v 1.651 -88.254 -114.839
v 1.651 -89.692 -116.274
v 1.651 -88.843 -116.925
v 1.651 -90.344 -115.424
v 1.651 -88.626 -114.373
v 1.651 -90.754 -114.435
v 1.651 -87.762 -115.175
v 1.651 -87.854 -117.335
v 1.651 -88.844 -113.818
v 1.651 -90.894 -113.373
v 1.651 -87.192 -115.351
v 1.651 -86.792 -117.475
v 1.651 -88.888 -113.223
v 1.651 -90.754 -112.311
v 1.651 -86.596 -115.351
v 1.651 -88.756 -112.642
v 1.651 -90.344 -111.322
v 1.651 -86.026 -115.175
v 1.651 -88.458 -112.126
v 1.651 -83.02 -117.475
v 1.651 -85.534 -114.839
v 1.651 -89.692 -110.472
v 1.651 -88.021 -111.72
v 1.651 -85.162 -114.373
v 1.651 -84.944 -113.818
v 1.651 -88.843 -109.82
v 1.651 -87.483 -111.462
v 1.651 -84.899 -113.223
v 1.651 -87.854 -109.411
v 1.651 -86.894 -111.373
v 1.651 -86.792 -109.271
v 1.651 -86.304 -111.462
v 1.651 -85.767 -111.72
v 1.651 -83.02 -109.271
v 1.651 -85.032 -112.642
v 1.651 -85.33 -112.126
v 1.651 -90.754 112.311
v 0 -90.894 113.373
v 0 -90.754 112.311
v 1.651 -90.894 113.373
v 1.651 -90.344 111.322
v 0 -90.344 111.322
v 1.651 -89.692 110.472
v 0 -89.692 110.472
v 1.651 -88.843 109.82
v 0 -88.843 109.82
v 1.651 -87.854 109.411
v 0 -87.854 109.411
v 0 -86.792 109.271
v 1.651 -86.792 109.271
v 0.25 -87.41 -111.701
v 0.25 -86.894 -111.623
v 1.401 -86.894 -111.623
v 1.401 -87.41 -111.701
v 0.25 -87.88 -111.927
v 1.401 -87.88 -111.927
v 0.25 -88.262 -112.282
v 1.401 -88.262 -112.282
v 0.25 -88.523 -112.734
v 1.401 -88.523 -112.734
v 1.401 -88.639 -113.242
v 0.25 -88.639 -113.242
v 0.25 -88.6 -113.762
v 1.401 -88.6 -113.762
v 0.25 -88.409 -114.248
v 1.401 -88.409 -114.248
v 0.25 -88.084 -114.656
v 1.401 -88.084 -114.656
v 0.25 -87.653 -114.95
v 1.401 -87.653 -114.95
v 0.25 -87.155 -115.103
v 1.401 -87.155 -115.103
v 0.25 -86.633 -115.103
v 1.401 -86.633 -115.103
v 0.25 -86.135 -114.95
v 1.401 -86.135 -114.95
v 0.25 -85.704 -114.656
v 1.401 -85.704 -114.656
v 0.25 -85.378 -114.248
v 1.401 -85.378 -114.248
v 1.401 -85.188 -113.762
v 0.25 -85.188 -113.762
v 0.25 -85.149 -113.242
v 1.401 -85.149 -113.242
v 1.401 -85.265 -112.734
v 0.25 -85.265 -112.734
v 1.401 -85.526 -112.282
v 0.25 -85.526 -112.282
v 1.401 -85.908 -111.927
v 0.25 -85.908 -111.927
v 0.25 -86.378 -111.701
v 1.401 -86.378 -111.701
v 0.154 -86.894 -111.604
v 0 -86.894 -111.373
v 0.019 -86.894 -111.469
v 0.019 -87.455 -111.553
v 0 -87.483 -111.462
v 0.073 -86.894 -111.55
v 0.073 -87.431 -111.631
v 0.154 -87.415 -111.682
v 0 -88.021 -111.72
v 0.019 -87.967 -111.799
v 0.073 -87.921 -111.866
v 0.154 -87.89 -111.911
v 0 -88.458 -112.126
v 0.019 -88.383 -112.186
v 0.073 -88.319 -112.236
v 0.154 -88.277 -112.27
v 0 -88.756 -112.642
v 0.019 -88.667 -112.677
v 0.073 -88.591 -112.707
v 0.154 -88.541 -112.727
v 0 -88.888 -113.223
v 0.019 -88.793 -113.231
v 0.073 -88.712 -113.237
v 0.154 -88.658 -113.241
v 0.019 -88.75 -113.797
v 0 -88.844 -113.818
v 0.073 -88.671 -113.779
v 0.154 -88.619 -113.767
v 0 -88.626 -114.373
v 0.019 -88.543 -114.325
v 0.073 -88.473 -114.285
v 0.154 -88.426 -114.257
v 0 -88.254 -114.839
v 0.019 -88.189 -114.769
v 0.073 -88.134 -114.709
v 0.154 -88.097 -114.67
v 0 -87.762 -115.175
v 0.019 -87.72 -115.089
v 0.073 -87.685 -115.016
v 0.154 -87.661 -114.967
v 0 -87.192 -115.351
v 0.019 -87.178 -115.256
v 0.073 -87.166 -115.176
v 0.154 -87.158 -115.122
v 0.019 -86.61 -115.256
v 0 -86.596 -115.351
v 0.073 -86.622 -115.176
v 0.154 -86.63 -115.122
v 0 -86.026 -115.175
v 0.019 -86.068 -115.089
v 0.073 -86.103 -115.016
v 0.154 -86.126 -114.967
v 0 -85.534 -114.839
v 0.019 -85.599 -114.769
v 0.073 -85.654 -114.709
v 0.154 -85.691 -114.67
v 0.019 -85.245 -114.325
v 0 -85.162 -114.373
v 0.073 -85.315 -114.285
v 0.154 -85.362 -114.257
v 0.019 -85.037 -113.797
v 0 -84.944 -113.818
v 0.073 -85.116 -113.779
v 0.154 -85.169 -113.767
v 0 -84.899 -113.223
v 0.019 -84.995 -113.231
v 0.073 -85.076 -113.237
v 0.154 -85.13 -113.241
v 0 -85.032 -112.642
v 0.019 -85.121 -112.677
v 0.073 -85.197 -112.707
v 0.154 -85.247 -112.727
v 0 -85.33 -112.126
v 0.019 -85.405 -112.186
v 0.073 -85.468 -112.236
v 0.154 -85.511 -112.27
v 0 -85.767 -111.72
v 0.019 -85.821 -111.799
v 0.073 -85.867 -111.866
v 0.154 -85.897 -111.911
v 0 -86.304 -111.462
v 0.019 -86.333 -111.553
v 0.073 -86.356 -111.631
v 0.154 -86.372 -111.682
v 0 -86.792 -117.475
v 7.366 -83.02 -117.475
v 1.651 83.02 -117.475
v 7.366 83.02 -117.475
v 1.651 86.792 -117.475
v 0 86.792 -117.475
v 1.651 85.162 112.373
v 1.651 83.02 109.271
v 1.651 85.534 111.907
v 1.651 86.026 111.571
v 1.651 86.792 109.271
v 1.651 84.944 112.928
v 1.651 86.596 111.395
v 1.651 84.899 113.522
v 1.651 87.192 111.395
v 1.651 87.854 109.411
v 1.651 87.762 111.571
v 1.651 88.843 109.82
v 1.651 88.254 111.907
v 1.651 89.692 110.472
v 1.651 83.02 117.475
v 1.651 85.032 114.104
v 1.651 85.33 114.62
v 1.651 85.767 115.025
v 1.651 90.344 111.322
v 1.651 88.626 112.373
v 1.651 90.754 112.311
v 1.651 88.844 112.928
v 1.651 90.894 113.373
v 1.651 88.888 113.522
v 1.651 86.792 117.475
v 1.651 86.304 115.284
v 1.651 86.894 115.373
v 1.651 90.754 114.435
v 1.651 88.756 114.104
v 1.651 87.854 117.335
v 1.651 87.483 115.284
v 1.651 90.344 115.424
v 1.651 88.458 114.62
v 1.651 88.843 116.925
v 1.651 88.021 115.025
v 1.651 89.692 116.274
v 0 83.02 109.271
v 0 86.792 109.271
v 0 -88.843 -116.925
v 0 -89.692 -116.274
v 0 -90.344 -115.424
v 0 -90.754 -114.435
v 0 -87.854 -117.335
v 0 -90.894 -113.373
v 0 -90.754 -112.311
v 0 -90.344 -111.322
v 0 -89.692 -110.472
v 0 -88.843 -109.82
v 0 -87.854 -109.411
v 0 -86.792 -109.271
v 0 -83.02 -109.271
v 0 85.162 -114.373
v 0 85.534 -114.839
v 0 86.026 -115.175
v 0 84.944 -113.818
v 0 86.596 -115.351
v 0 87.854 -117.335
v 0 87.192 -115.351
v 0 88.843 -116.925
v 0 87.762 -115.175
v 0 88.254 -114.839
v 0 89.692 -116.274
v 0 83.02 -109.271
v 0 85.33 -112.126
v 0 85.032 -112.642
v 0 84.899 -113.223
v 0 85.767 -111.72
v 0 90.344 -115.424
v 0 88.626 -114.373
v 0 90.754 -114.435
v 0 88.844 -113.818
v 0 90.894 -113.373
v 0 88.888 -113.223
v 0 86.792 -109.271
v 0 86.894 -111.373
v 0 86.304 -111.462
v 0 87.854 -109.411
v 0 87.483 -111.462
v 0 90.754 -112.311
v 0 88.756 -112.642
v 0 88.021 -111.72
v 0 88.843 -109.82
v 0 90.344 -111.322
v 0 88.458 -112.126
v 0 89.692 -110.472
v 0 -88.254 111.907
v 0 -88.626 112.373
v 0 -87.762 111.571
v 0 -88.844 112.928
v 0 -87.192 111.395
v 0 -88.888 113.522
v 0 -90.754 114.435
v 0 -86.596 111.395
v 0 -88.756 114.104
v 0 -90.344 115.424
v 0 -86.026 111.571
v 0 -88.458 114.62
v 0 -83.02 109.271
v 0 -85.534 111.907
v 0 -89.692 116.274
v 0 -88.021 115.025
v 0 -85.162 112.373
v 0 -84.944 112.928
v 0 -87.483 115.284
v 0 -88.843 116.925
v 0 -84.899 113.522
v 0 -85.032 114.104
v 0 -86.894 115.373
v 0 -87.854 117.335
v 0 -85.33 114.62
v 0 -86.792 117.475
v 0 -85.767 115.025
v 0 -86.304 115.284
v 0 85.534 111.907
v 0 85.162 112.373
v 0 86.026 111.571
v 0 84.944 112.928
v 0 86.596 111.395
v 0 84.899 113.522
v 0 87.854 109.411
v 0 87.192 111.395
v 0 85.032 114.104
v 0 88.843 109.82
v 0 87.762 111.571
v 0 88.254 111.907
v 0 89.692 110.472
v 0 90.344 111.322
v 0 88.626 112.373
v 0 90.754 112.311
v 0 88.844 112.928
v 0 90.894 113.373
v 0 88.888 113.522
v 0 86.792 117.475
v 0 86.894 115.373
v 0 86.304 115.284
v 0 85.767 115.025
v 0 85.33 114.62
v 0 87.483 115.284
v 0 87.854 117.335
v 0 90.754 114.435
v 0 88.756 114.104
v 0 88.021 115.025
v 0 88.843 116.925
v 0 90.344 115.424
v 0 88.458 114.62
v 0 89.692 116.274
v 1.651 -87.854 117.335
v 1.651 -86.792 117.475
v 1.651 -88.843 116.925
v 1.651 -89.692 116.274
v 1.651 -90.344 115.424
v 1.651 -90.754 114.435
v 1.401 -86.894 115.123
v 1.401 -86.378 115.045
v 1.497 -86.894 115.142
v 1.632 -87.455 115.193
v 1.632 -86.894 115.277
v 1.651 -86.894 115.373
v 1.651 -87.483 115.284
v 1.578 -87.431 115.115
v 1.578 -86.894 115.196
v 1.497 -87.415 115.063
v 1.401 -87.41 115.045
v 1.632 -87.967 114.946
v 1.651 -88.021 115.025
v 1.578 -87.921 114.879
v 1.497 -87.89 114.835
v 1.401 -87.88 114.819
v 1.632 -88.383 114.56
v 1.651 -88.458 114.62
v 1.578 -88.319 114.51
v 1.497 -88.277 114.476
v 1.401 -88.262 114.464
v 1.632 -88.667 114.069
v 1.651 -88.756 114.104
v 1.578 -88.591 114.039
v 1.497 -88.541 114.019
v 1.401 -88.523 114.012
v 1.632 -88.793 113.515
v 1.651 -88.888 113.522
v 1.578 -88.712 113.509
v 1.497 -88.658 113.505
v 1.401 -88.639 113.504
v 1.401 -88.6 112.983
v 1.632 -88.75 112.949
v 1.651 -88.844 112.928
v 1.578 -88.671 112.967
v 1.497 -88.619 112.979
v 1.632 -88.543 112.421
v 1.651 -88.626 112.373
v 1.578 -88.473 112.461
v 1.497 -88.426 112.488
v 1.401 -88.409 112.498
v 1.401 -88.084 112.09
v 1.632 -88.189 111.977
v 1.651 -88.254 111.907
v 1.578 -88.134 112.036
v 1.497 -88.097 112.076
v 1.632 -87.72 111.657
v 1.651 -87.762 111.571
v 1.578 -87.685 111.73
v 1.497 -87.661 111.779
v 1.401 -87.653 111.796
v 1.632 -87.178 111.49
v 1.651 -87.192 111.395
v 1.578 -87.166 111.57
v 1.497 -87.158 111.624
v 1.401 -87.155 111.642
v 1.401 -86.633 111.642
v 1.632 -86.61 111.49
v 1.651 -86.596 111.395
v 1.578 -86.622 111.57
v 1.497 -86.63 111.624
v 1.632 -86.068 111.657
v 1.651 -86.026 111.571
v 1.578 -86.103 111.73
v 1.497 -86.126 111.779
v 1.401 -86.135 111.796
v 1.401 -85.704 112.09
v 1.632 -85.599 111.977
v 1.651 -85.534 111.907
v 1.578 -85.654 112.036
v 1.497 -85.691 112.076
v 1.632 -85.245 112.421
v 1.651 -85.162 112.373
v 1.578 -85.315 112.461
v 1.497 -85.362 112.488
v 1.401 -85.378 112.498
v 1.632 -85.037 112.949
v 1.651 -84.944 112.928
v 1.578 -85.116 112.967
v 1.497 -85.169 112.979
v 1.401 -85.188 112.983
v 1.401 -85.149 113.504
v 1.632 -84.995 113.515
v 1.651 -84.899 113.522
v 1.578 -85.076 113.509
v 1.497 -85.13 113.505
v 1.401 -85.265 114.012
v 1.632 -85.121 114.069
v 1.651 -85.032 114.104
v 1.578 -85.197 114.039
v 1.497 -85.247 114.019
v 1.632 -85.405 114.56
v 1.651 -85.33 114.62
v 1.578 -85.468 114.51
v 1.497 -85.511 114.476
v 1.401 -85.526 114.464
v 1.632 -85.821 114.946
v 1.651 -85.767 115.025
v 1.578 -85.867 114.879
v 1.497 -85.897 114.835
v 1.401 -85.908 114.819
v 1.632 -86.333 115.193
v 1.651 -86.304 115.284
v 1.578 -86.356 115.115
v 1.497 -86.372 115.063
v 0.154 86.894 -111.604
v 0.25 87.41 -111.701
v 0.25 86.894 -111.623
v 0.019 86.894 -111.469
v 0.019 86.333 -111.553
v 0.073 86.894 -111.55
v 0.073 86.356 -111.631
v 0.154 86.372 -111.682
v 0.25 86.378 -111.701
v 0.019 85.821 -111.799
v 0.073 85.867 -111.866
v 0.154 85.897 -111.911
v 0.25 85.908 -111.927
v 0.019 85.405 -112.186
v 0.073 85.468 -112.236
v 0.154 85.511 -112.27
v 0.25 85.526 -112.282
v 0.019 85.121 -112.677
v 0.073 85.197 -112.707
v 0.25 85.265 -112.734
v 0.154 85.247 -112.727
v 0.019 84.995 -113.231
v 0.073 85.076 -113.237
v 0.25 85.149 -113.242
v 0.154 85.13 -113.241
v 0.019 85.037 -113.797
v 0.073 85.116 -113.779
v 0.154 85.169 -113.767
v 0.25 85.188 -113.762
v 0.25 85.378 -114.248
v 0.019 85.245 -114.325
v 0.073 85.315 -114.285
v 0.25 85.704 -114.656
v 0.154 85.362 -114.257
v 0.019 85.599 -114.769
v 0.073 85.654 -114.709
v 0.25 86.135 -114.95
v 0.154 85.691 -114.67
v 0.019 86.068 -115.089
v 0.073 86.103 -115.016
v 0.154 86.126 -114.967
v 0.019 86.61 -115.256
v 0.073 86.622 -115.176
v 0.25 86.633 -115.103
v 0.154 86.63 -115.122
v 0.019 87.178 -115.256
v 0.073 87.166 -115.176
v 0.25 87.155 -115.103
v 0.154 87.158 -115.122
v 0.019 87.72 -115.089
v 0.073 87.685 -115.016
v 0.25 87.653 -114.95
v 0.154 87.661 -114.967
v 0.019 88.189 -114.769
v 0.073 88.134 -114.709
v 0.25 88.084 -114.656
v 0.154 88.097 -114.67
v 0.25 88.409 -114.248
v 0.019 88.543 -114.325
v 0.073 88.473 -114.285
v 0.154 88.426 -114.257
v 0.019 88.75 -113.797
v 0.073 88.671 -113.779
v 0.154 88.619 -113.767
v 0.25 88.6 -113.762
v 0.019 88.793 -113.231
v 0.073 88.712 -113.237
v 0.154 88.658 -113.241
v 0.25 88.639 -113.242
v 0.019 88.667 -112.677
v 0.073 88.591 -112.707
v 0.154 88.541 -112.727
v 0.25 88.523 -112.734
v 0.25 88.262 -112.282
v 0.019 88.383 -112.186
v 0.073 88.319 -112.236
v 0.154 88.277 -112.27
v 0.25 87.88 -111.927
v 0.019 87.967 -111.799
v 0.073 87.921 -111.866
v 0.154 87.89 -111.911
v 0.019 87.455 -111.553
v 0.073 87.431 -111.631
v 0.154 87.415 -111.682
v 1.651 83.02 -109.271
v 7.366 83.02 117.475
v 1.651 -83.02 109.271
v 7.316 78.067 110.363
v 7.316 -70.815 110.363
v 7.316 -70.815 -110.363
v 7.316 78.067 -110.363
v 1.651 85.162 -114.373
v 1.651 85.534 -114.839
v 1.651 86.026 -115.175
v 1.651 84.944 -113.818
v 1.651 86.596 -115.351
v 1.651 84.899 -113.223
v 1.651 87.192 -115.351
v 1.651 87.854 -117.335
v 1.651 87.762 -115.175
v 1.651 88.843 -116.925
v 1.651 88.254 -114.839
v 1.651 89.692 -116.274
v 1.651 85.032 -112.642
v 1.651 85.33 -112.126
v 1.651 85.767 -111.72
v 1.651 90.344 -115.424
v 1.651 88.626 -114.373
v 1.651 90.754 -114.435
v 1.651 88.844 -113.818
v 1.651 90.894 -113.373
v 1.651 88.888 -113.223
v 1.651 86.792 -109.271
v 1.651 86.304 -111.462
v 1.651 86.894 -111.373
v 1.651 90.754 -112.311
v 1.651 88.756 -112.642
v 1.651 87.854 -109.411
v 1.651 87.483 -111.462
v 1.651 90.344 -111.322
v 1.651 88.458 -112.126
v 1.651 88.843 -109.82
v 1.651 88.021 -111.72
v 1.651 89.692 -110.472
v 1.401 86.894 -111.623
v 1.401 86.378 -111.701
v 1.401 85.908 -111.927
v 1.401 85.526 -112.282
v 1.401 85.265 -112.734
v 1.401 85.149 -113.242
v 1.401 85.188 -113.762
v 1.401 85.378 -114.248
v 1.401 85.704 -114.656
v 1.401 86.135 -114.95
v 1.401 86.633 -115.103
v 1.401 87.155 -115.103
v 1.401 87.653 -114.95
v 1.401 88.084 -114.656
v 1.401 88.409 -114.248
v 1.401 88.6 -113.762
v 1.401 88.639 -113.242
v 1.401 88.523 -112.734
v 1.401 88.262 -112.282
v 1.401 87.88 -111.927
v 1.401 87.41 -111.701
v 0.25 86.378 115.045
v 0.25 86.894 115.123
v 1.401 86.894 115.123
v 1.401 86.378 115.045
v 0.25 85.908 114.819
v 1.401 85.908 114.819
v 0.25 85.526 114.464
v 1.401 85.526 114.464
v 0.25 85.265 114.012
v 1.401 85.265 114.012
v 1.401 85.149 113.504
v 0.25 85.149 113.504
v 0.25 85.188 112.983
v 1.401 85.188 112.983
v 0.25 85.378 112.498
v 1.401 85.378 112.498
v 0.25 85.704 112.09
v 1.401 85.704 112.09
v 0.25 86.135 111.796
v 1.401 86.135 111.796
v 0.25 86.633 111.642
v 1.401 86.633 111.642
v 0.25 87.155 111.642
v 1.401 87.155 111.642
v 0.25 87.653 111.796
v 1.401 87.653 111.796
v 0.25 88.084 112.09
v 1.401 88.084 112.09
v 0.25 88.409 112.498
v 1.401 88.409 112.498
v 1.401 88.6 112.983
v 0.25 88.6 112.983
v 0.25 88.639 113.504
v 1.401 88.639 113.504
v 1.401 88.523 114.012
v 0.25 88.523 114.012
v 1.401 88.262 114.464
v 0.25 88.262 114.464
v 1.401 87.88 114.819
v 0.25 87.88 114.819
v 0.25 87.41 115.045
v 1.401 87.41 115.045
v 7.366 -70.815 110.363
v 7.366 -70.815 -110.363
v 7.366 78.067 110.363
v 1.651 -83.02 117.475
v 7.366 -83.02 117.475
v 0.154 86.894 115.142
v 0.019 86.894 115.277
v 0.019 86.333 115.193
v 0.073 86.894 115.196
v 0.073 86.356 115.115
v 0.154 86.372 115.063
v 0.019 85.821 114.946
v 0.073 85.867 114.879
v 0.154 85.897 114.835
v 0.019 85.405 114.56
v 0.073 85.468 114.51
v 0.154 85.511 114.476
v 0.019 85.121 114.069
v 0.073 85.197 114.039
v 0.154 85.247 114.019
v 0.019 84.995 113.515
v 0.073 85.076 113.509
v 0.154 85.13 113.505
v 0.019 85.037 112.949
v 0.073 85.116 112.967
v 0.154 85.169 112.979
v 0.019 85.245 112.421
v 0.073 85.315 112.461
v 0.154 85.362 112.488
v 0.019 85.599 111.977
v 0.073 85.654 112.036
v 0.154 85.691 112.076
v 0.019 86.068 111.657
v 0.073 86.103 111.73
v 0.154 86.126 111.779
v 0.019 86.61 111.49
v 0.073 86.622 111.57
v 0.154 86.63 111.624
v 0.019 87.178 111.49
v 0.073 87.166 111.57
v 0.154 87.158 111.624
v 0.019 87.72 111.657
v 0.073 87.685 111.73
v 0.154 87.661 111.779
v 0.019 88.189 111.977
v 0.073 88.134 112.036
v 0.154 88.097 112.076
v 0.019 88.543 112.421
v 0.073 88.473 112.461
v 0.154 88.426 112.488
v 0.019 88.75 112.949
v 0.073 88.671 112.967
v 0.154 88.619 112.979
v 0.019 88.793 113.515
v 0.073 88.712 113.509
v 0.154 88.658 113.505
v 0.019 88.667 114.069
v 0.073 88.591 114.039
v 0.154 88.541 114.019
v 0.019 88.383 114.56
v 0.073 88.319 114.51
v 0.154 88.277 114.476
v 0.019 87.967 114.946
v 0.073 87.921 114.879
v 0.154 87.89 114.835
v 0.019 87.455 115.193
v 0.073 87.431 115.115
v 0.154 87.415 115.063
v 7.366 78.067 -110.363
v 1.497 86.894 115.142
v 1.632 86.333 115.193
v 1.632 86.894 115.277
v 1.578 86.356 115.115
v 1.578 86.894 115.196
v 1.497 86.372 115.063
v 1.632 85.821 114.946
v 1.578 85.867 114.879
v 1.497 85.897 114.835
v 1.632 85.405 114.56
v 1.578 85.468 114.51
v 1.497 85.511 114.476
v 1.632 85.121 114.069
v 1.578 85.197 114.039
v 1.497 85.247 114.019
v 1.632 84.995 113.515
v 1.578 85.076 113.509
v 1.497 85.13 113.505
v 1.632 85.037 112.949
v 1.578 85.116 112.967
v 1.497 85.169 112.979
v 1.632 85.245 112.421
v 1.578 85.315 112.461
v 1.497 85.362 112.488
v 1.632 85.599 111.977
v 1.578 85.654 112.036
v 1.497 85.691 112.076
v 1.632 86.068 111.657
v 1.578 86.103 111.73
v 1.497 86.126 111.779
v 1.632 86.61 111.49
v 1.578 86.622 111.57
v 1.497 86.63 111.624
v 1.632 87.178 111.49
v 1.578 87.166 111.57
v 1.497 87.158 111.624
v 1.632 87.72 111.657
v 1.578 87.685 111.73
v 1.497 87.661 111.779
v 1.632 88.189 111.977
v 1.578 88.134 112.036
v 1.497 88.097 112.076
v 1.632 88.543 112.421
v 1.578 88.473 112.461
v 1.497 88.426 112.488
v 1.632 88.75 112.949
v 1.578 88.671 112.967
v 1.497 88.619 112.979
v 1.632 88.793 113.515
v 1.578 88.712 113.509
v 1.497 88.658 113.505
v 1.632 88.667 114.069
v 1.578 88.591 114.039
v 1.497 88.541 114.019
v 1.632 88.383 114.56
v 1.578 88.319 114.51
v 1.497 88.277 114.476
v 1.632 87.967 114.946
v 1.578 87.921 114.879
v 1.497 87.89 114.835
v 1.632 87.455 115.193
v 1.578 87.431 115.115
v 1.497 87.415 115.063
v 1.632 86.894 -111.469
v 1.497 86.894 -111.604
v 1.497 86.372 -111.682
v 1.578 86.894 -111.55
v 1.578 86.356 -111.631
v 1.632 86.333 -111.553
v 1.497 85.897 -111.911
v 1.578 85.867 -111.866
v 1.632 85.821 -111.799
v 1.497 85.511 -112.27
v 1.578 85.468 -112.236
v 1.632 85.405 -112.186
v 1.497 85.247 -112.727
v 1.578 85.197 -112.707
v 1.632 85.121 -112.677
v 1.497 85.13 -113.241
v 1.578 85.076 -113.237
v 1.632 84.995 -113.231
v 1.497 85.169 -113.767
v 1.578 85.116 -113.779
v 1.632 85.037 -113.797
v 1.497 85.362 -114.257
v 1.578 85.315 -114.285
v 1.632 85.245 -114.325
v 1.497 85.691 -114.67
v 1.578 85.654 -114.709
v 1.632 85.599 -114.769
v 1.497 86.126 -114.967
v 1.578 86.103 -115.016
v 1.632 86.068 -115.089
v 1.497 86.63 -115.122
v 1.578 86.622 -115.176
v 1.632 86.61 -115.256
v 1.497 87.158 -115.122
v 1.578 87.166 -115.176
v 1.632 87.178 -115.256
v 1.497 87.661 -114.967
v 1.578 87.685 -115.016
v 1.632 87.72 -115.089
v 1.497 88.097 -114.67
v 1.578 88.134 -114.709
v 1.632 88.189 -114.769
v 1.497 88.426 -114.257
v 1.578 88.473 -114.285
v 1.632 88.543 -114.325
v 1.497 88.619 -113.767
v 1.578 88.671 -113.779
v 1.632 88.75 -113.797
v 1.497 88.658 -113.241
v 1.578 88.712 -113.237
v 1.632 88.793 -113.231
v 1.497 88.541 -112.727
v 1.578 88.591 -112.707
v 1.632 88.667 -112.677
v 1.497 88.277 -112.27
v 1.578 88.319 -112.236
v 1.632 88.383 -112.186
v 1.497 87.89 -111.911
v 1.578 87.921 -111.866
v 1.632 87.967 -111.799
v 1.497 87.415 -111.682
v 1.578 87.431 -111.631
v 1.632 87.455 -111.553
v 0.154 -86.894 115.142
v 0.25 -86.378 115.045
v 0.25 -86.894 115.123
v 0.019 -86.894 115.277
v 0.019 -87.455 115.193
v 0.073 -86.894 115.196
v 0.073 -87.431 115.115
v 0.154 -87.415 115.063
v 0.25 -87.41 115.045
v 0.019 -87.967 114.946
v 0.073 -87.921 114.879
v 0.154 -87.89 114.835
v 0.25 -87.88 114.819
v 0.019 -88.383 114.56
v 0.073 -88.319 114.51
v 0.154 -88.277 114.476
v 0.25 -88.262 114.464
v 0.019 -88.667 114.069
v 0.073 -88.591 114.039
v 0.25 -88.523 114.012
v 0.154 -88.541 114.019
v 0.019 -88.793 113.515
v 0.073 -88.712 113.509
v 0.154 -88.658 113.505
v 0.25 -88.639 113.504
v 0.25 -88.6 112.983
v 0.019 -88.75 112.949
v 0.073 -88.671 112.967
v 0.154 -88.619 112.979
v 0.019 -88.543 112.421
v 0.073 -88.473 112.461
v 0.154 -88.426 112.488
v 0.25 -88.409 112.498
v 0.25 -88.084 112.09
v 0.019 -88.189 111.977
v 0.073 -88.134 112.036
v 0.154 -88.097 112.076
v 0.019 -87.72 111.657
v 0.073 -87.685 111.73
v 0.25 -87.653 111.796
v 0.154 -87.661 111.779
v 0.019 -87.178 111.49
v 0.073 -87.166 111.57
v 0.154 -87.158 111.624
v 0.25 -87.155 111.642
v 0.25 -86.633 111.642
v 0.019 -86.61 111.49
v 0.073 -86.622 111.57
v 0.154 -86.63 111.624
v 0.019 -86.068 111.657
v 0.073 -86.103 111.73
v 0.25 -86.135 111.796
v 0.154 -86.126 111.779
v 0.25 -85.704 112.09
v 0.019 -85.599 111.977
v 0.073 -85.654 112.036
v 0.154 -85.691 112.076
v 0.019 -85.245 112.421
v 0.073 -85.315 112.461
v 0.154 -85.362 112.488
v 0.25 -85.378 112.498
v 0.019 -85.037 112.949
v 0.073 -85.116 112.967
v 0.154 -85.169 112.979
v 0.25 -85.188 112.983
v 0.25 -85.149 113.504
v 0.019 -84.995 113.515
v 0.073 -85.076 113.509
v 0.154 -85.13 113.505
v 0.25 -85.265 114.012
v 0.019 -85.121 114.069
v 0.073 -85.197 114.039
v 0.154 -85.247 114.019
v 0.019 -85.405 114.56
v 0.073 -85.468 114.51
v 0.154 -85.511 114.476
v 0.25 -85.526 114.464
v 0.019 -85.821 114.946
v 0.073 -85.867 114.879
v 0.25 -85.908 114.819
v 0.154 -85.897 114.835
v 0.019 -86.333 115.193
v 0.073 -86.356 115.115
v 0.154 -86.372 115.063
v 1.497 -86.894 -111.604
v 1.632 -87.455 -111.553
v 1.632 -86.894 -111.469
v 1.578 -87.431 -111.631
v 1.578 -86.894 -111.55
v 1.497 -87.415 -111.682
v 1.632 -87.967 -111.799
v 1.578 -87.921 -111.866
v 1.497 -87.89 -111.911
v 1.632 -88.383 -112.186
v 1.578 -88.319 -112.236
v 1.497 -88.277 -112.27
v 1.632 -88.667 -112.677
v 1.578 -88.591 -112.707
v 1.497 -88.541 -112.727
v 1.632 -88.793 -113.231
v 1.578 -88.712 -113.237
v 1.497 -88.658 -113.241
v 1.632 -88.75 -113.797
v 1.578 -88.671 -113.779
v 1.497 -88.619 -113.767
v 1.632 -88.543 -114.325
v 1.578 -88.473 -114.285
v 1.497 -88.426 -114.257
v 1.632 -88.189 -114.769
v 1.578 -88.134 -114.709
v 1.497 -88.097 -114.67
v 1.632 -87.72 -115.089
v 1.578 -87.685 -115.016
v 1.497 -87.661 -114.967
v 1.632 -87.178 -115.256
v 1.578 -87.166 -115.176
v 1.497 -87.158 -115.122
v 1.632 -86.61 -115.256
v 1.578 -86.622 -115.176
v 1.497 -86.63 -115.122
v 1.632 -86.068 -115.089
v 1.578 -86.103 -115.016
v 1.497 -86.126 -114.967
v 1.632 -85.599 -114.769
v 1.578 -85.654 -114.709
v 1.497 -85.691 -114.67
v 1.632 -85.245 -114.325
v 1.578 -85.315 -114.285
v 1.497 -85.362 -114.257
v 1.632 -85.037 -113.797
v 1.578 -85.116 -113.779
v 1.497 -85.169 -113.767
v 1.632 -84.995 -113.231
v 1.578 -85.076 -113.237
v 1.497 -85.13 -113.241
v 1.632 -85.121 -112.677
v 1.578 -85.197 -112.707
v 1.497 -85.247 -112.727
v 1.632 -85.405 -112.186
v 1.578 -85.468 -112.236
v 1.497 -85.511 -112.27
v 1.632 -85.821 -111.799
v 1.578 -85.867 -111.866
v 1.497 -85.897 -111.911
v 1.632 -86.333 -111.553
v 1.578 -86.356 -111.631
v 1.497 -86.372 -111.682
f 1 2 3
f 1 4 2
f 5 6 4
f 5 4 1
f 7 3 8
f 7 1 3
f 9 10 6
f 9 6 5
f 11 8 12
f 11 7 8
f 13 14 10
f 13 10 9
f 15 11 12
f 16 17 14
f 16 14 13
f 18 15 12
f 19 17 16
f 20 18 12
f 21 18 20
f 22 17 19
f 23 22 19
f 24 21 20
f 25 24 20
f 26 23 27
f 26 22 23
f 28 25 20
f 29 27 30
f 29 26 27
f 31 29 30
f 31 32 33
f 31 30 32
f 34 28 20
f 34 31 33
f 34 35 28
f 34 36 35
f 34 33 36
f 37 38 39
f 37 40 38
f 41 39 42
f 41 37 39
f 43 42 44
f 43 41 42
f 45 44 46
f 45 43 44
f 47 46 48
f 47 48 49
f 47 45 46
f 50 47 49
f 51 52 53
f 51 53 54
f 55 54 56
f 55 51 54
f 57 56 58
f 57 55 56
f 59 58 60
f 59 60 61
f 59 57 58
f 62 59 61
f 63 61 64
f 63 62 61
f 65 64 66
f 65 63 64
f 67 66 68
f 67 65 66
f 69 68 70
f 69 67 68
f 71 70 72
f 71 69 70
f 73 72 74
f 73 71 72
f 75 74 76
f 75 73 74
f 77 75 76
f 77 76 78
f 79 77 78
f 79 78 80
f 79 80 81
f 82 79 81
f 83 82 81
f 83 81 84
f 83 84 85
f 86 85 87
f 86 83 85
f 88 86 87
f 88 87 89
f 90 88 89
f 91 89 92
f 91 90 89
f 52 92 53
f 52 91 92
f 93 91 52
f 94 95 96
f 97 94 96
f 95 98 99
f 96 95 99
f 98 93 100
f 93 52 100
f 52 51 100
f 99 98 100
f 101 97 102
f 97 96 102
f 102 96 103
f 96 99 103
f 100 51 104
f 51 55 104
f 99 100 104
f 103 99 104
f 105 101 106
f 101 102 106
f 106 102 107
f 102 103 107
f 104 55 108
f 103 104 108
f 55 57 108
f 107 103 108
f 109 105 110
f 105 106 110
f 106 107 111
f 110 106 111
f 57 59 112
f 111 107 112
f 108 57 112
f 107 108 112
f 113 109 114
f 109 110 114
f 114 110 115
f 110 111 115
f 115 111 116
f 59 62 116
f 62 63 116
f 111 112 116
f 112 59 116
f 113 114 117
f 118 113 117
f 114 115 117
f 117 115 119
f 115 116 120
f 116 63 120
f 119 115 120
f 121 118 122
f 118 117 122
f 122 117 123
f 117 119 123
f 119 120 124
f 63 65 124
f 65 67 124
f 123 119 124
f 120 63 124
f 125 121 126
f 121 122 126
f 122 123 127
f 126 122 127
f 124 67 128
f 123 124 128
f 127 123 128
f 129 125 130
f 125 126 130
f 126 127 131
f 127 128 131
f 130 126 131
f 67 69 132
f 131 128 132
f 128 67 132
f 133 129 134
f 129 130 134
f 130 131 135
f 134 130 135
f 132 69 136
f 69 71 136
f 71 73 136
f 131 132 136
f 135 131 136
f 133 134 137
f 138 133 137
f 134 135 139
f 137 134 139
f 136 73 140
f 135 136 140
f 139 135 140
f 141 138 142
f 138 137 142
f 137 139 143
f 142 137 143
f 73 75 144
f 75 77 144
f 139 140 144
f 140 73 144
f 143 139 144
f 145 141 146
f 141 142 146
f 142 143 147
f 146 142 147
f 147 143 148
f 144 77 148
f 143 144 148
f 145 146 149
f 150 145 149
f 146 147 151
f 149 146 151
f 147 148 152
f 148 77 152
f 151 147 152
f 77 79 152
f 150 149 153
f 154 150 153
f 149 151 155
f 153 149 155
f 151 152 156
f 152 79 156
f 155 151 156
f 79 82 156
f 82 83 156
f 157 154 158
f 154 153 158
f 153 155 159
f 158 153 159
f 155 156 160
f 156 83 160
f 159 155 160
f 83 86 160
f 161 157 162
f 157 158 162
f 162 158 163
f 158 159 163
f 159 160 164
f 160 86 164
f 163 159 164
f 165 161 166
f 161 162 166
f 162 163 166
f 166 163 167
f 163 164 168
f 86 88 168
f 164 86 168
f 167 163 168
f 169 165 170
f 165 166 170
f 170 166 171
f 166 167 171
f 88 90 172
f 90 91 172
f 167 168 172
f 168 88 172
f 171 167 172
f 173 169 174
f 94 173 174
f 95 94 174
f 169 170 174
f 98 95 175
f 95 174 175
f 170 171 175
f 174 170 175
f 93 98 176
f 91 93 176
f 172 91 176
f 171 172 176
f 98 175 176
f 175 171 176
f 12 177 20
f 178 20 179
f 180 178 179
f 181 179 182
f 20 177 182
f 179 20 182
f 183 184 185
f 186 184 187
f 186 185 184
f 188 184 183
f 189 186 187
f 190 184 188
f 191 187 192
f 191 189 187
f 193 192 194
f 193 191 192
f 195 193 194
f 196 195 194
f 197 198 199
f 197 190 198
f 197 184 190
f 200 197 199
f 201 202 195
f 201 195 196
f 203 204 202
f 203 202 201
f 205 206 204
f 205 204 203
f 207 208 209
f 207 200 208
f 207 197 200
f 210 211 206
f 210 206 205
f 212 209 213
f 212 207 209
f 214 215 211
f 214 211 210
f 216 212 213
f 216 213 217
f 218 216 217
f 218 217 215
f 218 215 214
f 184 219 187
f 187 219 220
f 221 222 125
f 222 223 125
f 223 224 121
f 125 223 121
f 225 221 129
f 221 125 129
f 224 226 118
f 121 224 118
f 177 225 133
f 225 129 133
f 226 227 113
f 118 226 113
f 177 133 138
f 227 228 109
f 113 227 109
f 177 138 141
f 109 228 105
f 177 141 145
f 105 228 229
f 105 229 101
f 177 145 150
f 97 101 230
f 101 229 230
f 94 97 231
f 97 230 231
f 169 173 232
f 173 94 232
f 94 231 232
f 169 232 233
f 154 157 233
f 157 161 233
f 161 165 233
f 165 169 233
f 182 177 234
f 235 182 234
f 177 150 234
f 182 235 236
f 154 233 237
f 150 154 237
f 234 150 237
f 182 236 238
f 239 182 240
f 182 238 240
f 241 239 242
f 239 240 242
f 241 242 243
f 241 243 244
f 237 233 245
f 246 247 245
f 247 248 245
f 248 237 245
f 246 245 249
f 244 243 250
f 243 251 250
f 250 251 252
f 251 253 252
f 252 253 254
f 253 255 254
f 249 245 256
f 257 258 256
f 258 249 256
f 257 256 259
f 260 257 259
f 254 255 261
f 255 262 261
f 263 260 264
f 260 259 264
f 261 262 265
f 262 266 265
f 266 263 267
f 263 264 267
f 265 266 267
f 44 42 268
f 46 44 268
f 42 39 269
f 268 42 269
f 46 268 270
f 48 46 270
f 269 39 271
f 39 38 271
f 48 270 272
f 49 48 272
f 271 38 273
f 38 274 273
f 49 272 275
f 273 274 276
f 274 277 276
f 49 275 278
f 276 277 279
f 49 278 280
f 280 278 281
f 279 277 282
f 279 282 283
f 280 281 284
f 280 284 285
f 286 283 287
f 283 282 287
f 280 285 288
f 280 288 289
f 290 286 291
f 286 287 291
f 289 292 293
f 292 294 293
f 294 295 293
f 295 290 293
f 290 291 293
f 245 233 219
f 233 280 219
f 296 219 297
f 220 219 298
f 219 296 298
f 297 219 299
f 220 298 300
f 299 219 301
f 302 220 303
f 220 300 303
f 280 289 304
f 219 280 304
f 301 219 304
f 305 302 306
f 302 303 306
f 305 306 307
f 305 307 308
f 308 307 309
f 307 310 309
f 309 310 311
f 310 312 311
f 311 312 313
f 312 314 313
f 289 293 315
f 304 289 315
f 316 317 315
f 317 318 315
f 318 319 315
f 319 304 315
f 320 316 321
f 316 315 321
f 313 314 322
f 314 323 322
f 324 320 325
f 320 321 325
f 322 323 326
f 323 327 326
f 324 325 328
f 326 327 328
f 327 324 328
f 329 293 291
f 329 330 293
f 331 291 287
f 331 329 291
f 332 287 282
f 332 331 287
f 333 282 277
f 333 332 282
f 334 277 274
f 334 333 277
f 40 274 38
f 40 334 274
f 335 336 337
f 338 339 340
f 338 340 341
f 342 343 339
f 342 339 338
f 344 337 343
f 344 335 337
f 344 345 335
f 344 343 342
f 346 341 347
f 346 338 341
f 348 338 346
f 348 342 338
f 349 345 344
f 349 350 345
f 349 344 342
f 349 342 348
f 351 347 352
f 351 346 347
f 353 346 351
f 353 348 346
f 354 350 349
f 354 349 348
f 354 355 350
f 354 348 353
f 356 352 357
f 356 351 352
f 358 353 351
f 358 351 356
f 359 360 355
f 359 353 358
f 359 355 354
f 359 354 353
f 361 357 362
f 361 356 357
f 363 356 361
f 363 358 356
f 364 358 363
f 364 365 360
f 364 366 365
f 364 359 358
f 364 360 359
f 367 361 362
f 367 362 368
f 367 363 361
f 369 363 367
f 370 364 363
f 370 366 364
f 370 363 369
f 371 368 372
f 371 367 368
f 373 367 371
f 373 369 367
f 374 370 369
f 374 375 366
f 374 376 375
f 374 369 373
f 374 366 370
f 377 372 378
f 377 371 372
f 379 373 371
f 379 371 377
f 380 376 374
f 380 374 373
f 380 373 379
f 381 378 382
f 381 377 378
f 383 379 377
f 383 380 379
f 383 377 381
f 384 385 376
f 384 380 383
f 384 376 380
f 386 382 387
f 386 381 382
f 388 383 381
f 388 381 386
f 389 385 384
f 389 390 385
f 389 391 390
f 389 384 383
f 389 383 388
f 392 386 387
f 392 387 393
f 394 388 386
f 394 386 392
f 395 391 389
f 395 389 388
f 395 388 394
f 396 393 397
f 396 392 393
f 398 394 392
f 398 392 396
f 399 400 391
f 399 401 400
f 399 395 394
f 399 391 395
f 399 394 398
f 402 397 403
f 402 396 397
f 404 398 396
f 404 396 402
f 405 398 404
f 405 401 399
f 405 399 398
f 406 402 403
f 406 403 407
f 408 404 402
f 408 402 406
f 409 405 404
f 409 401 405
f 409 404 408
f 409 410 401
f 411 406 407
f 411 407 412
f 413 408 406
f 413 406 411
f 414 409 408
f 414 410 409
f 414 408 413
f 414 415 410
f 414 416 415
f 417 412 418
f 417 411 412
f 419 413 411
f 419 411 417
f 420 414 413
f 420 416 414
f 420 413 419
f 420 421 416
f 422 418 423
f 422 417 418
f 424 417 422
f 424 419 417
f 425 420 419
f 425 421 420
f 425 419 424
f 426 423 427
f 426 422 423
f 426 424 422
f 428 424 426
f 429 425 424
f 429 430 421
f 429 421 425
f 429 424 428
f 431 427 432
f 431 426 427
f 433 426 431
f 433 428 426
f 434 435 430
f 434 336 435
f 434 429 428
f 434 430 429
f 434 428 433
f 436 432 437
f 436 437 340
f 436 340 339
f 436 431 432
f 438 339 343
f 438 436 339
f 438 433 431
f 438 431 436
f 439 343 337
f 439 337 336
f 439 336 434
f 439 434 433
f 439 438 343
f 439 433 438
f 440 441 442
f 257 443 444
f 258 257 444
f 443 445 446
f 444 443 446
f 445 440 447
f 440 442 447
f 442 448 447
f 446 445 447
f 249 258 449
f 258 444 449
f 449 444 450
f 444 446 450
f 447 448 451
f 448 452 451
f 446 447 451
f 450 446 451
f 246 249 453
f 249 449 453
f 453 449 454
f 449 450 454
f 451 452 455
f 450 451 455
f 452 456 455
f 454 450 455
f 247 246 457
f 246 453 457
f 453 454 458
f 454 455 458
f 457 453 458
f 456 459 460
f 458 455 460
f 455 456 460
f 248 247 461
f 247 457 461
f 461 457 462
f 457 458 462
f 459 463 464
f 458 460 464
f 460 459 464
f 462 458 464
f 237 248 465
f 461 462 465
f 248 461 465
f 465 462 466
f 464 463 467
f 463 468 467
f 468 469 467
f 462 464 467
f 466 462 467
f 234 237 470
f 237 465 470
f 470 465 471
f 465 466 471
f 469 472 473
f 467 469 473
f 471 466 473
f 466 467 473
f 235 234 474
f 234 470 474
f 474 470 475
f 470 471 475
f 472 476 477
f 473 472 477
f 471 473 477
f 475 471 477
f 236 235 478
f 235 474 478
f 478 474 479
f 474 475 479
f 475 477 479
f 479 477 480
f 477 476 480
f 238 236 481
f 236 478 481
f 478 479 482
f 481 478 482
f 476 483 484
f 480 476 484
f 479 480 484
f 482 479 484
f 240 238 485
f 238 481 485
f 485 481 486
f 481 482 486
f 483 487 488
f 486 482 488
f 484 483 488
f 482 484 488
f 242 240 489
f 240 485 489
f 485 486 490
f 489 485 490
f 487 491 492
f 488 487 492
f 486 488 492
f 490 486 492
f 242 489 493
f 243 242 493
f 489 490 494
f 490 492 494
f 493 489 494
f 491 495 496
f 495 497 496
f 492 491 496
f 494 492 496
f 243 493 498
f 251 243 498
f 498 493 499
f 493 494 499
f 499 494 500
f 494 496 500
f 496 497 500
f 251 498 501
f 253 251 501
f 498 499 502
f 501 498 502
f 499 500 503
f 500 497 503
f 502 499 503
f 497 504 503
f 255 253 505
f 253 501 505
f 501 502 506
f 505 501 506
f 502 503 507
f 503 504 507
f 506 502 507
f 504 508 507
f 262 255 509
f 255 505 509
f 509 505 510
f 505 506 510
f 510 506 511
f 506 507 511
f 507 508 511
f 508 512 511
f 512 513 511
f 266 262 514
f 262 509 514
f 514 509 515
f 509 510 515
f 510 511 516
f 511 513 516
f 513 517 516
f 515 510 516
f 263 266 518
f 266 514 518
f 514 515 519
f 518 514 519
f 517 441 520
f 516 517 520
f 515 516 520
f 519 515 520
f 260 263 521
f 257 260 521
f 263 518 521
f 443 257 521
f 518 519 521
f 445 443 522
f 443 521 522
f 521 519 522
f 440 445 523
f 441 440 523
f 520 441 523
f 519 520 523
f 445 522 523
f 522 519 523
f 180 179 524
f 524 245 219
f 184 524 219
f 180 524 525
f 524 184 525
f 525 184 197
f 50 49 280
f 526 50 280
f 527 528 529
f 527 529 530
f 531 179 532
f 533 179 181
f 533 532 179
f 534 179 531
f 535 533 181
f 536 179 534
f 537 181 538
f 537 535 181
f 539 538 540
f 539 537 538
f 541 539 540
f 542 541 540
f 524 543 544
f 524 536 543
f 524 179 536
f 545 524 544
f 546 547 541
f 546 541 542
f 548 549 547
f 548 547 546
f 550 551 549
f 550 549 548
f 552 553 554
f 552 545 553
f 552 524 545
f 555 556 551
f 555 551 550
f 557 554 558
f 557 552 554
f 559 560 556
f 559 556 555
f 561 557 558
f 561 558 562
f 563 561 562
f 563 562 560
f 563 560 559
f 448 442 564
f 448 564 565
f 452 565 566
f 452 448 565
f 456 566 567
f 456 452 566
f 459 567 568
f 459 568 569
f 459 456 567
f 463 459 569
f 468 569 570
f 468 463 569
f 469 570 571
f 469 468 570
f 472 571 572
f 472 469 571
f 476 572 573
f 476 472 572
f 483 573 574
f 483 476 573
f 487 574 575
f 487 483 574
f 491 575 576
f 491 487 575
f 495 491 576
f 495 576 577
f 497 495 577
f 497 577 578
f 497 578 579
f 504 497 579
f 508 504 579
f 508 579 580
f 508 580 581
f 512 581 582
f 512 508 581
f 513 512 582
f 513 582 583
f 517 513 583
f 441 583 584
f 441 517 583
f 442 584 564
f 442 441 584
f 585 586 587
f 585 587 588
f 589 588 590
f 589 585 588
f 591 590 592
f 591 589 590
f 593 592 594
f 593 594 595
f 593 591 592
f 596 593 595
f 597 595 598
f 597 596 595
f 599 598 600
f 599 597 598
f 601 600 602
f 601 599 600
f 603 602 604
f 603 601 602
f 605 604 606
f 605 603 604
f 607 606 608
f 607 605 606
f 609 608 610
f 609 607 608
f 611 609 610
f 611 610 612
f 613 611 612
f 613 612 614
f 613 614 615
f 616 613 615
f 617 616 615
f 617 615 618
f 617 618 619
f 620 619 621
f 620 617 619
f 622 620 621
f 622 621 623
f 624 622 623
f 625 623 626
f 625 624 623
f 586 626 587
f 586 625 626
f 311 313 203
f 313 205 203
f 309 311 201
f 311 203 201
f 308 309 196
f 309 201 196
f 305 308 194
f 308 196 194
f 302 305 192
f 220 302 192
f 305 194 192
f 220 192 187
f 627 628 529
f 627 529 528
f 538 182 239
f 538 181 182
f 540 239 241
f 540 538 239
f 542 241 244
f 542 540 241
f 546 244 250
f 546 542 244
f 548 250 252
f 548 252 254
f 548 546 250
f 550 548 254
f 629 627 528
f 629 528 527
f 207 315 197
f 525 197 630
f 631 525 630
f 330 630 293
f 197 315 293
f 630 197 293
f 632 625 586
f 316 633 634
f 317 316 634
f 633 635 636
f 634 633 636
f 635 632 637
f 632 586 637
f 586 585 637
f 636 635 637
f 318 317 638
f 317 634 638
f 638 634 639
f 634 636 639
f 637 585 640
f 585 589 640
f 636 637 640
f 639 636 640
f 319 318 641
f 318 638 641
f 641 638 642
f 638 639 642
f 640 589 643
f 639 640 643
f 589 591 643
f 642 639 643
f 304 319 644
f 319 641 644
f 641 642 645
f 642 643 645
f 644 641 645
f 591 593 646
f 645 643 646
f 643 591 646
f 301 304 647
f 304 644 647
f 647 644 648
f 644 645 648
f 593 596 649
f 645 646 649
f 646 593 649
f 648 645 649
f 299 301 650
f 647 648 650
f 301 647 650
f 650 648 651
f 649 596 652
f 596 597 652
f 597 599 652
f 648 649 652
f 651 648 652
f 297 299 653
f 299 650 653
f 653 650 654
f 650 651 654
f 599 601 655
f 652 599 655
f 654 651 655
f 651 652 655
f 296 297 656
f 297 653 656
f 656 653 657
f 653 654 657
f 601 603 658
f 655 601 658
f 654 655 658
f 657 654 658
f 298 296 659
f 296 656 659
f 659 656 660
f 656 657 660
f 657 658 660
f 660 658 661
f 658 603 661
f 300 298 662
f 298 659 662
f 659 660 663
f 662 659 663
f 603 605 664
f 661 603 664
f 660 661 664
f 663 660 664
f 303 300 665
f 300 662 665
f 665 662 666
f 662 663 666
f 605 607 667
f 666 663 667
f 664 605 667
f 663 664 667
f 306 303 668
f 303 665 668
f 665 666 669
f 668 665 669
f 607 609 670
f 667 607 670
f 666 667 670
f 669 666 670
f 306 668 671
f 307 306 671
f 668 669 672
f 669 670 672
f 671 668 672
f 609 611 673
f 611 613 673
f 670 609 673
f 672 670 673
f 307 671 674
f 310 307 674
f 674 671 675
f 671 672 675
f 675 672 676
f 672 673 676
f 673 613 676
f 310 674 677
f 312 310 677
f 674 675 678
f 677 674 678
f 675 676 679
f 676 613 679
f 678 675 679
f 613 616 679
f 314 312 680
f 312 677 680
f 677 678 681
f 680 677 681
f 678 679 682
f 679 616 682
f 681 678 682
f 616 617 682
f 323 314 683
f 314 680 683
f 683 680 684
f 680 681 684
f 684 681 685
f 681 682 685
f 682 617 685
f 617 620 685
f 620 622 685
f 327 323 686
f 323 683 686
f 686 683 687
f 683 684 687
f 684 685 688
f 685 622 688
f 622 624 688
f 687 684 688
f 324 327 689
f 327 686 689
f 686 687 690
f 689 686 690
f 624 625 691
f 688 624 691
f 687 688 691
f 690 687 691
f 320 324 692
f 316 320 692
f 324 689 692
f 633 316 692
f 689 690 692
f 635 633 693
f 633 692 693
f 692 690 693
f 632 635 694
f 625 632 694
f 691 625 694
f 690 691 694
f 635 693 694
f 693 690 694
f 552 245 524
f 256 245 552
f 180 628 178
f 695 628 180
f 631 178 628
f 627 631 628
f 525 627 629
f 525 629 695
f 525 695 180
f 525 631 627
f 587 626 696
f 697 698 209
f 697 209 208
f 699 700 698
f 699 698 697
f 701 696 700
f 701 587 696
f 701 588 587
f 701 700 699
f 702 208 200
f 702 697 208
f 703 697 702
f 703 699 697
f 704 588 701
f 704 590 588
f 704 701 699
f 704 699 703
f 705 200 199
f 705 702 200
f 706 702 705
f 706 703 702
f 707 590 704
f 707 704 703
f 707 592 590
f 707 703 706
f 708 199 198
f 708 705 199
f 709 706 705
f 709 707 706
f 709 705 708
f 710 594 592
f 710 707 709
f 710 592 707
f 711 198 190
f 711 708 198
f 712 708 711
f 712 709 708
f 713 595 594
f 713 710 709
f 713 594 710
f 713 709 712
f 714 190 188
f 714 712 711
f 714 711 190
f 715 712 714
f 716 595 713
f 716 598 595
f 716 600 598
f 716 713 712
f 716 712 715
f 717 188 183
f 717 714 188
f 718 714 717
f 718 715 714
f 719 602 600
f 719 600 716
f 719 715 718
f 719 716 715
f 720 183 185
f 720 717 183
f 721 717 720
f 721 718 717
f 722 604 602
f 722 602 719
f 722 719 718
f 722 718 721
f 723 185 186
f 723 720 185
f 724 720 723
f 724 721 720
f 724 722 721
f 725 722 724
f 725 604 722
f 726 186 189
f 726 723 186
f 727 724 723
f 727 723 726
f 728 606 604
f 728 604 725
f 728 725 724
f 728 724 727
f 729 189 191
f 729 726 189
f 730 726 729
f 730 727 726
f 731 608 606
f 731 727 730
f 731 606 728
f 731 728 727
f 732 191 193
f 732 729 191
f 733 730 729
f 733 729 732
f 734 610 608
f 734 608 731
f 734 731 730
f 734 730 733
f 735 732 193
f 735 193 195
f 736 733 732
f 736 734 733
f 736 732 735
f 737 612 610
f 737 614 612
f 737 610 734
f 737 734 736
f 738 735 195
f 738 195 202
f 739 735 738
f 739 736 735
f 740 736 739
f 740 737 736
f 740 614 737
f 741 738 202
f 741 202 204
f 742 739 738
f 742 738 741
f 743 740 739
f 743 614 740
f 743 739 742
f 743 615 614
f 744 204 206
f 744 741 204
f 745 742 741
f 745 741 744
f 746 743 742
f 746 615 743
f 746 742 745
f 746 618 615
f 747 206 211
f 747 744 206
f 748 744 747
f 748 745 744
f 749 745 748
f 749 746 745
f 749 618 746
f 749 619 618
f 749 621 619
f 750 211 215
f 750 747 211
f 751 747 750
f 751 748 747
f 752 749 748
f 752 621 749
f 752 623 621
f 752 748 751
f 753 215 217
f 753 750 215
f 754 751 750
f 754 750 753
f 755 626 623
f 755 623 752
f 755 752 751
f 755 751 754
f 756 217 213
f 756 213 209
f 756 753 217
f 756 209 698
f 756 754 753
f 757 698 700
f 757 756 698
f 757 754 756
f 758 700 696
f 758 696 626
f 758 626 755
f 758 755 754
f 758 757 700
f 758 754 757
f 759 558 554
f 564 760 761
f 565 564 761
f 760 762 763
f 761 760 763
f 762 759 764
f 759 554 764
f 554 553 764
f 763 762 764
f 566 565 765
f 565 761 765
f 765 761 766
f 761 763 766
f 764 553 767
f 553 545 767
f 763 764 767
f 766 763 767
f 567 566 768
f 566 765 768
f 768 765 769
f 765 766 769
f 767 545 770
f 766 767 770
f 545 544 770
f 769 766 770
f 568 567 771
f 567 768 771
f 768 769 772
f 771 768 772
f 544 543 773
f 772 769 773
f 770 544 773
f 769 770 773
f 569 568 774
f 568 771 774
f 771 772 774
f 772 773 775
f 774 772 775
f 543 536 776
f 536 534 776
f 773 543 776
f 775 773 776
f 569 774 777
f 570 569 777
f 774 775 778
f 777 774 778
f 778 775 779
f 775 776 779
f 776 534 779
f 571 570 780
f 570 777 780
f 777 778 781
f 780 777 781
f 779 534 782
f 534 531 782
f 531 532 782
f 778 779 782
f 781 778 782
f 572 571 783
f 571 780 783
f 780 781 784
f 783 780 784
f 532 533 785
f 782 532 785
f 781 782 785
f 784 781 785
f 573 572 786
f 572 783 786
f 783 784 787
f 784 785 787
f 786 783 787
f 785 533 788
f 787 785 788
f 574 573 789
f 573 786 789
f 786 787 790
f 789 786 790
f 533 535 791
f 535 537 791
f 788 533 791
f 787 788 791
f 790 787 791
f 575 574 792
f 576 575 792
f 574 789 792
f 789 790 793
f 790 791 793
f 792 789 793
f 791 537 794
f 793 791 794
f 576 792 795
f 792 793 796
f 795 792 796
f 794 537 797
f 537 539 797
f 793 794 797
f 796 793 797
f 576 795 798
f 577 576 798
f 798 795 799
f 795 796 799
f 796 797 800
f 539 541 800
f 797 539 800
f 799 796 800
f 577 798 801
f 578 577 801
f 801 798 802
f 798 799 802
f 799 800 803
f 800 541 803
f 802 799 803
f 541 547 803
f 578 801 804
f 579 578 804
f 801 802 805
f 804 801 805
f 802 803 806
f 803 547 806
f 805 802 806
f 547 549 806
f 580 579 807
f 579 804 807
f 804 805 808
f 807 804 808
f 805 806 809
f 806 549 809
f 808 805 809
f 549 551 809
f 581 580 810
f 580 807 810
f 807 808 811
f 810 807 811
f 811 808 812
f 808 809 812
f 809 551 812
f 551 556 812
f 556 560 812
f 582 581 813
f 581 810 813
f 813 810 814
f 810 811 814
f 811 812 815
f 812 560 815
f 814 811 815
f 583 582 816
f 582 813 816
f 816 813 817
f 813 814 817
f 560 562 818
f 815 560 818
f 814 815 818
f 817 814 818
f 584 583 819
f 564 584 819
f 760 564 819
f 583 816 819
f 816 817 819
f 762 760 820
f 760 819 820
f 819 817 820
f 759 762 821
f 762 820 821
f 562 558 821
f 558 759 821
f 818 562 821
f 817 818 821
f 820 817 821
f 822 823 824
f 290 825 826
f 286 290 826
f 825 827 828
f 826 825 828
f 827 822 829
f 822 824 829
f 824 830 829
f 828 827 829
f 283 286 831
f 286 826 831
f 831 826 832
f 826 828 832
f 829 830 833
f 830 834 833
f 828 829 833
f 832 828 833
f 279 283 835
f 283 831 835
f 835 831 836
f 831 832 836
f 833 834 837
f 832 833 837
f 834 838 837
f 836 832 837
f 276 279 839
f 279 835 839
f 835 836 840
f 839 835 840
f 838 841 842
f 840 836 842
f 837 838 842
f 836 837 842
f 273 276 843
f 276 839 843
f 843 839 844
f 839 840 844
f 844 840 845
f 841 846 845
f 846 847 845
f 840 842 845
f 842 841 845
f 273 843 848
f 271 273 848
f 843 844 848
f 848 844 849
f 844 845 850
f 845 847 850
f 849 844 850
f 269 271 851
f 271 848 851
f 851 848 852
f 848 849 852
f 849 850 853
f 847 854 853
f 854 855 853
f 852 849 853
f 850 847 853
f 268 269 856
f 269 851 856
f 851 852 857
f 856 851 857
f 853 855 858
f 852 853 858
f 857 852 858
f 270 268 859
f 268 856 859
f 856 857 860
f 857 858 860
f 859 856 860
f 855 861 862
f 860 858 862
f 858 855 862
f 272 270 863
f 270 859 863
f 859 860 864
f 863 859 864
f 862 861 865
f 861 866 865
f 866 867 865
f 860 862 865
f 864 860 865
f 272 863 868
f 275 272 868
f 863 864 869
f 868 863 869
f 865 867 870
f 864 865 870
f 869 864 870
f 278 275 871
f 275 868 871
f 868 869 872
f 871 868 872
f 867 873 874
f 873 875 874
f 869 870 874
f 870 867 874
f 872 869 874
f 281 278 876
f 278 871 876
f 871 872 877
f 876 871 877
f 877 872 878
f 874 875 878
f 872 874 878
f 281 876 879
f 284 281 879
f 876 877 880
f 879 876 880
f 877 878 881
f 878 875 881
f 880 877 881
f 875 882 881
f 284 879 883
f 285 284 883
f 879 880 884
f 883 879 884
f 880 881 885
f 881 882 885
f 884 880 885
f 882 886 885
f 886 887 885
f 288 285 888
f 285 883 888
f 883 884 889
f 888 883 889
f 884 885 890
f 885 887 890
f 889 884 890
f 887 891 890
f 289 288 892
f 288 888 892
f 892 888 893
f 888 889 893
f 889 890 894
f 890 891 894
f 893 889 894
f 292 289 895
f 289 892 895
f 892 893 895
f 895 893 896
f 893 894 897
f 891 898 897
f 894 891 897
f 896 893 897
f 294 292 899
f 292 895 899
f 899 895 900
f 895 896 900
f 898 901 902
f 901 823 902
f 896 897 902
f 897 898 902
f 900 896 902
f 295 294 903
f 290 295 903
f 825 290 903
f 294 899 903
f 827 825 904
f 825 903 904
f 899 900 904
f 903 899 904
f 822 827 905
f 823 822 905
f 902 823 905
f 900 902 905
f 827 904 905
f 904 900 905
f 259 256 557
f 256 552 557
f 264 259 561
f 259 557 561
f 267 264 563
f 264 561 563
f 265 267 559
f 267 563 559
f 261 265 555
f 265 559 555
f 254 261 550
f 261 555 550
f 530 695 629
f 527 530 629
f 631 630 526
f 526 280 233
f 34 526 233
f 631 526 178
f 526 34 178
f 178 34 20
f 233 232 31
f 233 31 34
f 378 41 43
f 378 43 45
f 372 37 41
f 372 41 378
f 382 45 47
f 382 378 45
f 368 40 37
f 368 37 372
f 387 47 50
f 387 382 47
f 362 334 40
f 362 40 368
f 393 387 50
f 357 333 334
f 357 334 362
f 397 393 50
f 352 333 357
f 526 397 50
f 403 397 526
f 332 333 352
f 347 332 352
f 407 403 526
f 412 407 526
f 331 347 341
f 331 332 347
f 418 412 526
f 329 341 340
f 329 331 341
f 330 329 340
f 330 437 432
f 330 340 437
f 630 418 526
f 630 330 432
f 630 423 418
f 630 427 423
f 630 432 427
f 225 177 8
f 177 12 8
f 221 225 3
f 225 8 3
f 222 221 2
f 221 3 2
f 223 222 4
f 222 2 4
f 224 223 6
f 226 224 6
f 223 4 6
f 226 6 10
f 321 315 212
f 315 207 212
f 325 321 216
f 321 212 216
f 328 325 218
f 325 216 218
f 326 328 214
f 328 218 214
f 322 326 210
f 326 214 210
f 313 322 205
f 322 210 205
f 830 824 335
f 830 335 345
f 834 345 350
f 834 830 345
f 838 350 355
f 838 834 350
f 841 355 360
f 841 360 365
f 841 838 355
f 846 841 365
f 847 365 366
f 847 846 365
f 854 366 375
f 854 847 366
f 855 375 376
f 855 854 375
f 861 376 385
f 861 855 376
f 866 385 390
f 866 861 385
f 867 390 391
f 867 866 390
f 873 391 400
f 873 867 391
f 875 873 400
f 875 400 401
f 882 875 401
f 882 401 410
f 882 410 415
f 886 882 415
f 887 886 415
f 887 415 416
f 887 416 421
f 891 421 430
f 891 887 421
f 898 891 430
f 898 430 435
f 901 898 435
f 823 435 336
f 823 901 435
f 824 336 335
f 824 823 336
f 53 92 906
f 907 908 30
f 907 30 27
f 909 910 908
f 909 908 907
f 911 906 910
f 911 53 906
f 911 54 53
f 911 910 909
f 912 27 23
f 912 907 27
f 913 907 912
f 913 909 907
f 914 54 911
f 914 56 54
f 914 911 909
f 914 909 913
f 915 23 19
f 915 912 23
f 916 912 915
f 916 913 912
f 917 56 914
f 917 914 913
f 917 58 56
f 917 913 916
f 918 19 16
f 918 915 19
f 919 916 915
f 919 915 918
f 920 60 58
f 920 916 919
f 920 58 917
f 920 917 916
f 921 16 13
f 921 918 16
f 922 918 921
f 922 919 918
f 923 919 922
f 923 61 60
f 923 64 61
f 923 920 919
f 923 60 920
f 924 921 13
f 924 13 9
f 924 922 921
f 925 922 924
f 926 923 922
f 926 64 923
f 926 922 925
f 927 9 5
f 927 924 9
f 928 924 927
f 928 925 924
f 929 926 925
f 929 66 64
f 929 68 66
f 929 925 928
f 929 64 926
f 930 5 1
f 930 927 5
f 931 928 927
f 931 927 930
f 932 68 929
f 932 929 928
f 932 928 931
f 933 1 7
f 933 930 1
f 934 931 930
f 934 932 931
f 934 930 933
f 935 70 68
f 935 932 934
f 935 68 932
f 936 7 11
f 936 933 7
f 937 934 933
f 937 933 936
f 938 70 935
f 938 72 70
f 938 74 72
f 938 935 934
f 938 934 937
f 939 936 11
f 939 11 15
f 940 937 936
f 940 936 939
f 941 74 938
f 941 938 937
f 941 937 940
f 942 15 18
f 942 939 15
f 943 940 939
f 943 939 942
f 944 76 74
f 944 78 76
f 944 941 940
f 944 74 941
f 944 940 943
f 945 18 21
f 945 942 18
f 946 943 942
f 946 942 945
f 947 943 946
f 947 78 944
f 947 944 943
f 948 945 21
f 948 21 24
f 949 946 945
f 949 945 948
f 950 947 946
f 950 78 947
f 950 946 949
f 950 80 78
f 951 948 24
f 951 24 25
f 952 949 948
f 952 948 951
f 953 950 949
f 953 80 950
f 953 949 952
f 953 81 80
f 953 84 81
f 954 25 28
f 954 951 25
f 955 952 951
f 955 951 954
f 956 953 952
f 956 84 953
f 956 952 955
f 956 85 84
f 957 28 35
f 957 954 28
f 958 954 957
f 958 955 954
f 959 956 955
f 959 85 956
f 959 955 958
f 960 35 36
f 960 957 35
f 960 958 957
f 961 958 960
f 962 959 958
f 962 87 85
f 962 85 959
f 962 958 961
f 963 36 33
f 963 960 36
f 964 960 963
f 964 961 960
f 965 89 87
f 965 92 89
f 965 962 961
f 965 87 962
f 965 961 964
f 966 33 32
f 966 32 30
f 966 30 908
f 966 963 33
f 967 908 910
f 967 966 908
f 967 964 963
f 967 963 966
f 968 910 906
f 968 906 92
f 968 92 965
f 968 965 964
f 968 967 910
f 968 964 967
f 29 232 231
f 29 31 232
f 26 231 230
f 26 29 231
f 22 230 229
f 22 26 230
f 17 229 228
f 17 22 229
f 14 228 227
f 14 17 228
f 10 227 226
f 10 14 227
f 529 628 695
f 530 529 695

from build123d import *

# Parameters (mm, degrees)
SKETCH1_W           = 7.874
SKETCH1_H           = 8.2042
SKETCH1_R           = 1.75
SKETCH1_W_2         = 166.0398
SKETCH1_H_2         = 234.95
BOSS_EXTRUDE1_DEPTH = 1.651
BOSS_EXTRUDE2_DEPTH = 5.715
SKETCH3_W           = 148.8821
SKETCH3_H           = 220.726
CUT_EXTRUDE1_DEPTH  = 0.05
FILLET1_R           = 4.1021
FILLET2_R           = 0.25


with BuildPart() as part:
    # Sketch1 → Boss-Extrude1 (new body)
    # profile 1 of 5: a face of its own
    with BuildSketch(Plane.YZ):
        with Locations((-86.9569, 113.3729)):
            Rectangle(SKETCH1_W, SKETCH1_H)
        with Locations(Location((-86.8939, 113.3729, 0), (0, 0, 90))):
            Circle(SKETCH1_R, mode=Mode.SUBTRACT)
    # profile 2 of 5: a face of its own
    with BuildSketch(Plane.YZ):
        Rectangle(SKETCH1_W_2, SKETCH1_H_2)
    # profile 3 of 5: a face of its own
    with BuildSketch(Plane.YZ):
        with Locations((86.9569, 113.3729)):
            Rectangle(SKETCH1_W, SKETCH1_H)
        with Locations(Location((86.8939, 113.3729, 0), (0, 0, 90))):
            Circle(SKETCH1_R, mode=Mode.SUBTRACT)
    # profile 4 of 5: a face of its own
    with BuildSketch(Plane.YZ):
        with Locations((86.9569, -113.3729)):
            Rectangle(SKETCH1_W, SKETCH1_H)
        with Locations(Location((86.8939, -113.3729, 0), (0, 0, 90))):
            Circle(SKETCH1_R, mode=Mode.SUBTRACT)
    # profile 5 of 5: a face of its own
    with BuildSketch(Plane.YZ):
        with Locations((-86.9569, -113.3729)):
            Rectangle(SKETCH1_W, SKETCH1_H)
        with Locations(Location((-86.8939, -113.3729, 0), (0, 0, 90))):
            Circle(SKETCH1_R, mode=Mode.SUBTRACT)
    extrude(amount=BOSS_EXTRUDE1_DEPTH)

    # Sketch2 → Boss-Extrude2 (add)
    with BuildSketch(Plane.YZ.offset(1.651)):
        Polygon((83.0199, 117.475), (-83.0199, 117.475), (-83.0199, 109.2708), (-83.0199, -109.2708), (-83.0199, -117.475), (83.0199, -117.475), (83.0199, -109.2708), (83.0199, 109.2708), align=None)
    extrude(amount=BOSS_EXTRUDE2_DEPTH)

    # Sketch3 → Cut-Extrude1 (cut)
    with BuildSketch(Plane.YZ.offset(7.366)):
        with Locations((3.62585, 0)):
            Rectangle(SKETCH3_W, SKETCH3_H)
    extrude(amount=-CUT_EXTRUDE1_DEPTH, mode=Mode.SUBTRACT)

    # Fillet1
    fillet1_edges = [part.edges().sort_by_distance(p)[0] for p in [
        (0.8255, -90.8939, -117.475),
        (0.8255, -90.8939, -109.2708),
        (0.8255, -90.8939, 109.2708),
        (0.8255, -90.8939, 117.475),
        (0.8255, 90.8939, 117.475),
        (0.8255, 90.8939, 109.2708),
        (0.8255, 90.8939, -109.2708),
        (0.8255, 90.8939, -117.475),
    ]]
    fillet(fillet1_edges, radius=FILLET1_R - 0.0001)  # a hair under: the kernel refuses the full size

    # Fillet2
    fillet2_edges = [part.edges().sort_by_distance(p)[0] for p in [
        (1.651, 86.8939, -115.1229),
        (0, 86.8939, -115.1229),
        (0, 86.8939, 111.6229),
        (0, -86.8939, -115.1229),
        (0, -86.8939, 111.6229),
        (1.651, -86.8939, 111.6229),
        (1.651, -86.8939, -115.1229),
        (1.651, 86.8939, 111.6229),
    ]]
    fillet(fillet2_edges, radius=FILLET2_R)


solid = part.part
